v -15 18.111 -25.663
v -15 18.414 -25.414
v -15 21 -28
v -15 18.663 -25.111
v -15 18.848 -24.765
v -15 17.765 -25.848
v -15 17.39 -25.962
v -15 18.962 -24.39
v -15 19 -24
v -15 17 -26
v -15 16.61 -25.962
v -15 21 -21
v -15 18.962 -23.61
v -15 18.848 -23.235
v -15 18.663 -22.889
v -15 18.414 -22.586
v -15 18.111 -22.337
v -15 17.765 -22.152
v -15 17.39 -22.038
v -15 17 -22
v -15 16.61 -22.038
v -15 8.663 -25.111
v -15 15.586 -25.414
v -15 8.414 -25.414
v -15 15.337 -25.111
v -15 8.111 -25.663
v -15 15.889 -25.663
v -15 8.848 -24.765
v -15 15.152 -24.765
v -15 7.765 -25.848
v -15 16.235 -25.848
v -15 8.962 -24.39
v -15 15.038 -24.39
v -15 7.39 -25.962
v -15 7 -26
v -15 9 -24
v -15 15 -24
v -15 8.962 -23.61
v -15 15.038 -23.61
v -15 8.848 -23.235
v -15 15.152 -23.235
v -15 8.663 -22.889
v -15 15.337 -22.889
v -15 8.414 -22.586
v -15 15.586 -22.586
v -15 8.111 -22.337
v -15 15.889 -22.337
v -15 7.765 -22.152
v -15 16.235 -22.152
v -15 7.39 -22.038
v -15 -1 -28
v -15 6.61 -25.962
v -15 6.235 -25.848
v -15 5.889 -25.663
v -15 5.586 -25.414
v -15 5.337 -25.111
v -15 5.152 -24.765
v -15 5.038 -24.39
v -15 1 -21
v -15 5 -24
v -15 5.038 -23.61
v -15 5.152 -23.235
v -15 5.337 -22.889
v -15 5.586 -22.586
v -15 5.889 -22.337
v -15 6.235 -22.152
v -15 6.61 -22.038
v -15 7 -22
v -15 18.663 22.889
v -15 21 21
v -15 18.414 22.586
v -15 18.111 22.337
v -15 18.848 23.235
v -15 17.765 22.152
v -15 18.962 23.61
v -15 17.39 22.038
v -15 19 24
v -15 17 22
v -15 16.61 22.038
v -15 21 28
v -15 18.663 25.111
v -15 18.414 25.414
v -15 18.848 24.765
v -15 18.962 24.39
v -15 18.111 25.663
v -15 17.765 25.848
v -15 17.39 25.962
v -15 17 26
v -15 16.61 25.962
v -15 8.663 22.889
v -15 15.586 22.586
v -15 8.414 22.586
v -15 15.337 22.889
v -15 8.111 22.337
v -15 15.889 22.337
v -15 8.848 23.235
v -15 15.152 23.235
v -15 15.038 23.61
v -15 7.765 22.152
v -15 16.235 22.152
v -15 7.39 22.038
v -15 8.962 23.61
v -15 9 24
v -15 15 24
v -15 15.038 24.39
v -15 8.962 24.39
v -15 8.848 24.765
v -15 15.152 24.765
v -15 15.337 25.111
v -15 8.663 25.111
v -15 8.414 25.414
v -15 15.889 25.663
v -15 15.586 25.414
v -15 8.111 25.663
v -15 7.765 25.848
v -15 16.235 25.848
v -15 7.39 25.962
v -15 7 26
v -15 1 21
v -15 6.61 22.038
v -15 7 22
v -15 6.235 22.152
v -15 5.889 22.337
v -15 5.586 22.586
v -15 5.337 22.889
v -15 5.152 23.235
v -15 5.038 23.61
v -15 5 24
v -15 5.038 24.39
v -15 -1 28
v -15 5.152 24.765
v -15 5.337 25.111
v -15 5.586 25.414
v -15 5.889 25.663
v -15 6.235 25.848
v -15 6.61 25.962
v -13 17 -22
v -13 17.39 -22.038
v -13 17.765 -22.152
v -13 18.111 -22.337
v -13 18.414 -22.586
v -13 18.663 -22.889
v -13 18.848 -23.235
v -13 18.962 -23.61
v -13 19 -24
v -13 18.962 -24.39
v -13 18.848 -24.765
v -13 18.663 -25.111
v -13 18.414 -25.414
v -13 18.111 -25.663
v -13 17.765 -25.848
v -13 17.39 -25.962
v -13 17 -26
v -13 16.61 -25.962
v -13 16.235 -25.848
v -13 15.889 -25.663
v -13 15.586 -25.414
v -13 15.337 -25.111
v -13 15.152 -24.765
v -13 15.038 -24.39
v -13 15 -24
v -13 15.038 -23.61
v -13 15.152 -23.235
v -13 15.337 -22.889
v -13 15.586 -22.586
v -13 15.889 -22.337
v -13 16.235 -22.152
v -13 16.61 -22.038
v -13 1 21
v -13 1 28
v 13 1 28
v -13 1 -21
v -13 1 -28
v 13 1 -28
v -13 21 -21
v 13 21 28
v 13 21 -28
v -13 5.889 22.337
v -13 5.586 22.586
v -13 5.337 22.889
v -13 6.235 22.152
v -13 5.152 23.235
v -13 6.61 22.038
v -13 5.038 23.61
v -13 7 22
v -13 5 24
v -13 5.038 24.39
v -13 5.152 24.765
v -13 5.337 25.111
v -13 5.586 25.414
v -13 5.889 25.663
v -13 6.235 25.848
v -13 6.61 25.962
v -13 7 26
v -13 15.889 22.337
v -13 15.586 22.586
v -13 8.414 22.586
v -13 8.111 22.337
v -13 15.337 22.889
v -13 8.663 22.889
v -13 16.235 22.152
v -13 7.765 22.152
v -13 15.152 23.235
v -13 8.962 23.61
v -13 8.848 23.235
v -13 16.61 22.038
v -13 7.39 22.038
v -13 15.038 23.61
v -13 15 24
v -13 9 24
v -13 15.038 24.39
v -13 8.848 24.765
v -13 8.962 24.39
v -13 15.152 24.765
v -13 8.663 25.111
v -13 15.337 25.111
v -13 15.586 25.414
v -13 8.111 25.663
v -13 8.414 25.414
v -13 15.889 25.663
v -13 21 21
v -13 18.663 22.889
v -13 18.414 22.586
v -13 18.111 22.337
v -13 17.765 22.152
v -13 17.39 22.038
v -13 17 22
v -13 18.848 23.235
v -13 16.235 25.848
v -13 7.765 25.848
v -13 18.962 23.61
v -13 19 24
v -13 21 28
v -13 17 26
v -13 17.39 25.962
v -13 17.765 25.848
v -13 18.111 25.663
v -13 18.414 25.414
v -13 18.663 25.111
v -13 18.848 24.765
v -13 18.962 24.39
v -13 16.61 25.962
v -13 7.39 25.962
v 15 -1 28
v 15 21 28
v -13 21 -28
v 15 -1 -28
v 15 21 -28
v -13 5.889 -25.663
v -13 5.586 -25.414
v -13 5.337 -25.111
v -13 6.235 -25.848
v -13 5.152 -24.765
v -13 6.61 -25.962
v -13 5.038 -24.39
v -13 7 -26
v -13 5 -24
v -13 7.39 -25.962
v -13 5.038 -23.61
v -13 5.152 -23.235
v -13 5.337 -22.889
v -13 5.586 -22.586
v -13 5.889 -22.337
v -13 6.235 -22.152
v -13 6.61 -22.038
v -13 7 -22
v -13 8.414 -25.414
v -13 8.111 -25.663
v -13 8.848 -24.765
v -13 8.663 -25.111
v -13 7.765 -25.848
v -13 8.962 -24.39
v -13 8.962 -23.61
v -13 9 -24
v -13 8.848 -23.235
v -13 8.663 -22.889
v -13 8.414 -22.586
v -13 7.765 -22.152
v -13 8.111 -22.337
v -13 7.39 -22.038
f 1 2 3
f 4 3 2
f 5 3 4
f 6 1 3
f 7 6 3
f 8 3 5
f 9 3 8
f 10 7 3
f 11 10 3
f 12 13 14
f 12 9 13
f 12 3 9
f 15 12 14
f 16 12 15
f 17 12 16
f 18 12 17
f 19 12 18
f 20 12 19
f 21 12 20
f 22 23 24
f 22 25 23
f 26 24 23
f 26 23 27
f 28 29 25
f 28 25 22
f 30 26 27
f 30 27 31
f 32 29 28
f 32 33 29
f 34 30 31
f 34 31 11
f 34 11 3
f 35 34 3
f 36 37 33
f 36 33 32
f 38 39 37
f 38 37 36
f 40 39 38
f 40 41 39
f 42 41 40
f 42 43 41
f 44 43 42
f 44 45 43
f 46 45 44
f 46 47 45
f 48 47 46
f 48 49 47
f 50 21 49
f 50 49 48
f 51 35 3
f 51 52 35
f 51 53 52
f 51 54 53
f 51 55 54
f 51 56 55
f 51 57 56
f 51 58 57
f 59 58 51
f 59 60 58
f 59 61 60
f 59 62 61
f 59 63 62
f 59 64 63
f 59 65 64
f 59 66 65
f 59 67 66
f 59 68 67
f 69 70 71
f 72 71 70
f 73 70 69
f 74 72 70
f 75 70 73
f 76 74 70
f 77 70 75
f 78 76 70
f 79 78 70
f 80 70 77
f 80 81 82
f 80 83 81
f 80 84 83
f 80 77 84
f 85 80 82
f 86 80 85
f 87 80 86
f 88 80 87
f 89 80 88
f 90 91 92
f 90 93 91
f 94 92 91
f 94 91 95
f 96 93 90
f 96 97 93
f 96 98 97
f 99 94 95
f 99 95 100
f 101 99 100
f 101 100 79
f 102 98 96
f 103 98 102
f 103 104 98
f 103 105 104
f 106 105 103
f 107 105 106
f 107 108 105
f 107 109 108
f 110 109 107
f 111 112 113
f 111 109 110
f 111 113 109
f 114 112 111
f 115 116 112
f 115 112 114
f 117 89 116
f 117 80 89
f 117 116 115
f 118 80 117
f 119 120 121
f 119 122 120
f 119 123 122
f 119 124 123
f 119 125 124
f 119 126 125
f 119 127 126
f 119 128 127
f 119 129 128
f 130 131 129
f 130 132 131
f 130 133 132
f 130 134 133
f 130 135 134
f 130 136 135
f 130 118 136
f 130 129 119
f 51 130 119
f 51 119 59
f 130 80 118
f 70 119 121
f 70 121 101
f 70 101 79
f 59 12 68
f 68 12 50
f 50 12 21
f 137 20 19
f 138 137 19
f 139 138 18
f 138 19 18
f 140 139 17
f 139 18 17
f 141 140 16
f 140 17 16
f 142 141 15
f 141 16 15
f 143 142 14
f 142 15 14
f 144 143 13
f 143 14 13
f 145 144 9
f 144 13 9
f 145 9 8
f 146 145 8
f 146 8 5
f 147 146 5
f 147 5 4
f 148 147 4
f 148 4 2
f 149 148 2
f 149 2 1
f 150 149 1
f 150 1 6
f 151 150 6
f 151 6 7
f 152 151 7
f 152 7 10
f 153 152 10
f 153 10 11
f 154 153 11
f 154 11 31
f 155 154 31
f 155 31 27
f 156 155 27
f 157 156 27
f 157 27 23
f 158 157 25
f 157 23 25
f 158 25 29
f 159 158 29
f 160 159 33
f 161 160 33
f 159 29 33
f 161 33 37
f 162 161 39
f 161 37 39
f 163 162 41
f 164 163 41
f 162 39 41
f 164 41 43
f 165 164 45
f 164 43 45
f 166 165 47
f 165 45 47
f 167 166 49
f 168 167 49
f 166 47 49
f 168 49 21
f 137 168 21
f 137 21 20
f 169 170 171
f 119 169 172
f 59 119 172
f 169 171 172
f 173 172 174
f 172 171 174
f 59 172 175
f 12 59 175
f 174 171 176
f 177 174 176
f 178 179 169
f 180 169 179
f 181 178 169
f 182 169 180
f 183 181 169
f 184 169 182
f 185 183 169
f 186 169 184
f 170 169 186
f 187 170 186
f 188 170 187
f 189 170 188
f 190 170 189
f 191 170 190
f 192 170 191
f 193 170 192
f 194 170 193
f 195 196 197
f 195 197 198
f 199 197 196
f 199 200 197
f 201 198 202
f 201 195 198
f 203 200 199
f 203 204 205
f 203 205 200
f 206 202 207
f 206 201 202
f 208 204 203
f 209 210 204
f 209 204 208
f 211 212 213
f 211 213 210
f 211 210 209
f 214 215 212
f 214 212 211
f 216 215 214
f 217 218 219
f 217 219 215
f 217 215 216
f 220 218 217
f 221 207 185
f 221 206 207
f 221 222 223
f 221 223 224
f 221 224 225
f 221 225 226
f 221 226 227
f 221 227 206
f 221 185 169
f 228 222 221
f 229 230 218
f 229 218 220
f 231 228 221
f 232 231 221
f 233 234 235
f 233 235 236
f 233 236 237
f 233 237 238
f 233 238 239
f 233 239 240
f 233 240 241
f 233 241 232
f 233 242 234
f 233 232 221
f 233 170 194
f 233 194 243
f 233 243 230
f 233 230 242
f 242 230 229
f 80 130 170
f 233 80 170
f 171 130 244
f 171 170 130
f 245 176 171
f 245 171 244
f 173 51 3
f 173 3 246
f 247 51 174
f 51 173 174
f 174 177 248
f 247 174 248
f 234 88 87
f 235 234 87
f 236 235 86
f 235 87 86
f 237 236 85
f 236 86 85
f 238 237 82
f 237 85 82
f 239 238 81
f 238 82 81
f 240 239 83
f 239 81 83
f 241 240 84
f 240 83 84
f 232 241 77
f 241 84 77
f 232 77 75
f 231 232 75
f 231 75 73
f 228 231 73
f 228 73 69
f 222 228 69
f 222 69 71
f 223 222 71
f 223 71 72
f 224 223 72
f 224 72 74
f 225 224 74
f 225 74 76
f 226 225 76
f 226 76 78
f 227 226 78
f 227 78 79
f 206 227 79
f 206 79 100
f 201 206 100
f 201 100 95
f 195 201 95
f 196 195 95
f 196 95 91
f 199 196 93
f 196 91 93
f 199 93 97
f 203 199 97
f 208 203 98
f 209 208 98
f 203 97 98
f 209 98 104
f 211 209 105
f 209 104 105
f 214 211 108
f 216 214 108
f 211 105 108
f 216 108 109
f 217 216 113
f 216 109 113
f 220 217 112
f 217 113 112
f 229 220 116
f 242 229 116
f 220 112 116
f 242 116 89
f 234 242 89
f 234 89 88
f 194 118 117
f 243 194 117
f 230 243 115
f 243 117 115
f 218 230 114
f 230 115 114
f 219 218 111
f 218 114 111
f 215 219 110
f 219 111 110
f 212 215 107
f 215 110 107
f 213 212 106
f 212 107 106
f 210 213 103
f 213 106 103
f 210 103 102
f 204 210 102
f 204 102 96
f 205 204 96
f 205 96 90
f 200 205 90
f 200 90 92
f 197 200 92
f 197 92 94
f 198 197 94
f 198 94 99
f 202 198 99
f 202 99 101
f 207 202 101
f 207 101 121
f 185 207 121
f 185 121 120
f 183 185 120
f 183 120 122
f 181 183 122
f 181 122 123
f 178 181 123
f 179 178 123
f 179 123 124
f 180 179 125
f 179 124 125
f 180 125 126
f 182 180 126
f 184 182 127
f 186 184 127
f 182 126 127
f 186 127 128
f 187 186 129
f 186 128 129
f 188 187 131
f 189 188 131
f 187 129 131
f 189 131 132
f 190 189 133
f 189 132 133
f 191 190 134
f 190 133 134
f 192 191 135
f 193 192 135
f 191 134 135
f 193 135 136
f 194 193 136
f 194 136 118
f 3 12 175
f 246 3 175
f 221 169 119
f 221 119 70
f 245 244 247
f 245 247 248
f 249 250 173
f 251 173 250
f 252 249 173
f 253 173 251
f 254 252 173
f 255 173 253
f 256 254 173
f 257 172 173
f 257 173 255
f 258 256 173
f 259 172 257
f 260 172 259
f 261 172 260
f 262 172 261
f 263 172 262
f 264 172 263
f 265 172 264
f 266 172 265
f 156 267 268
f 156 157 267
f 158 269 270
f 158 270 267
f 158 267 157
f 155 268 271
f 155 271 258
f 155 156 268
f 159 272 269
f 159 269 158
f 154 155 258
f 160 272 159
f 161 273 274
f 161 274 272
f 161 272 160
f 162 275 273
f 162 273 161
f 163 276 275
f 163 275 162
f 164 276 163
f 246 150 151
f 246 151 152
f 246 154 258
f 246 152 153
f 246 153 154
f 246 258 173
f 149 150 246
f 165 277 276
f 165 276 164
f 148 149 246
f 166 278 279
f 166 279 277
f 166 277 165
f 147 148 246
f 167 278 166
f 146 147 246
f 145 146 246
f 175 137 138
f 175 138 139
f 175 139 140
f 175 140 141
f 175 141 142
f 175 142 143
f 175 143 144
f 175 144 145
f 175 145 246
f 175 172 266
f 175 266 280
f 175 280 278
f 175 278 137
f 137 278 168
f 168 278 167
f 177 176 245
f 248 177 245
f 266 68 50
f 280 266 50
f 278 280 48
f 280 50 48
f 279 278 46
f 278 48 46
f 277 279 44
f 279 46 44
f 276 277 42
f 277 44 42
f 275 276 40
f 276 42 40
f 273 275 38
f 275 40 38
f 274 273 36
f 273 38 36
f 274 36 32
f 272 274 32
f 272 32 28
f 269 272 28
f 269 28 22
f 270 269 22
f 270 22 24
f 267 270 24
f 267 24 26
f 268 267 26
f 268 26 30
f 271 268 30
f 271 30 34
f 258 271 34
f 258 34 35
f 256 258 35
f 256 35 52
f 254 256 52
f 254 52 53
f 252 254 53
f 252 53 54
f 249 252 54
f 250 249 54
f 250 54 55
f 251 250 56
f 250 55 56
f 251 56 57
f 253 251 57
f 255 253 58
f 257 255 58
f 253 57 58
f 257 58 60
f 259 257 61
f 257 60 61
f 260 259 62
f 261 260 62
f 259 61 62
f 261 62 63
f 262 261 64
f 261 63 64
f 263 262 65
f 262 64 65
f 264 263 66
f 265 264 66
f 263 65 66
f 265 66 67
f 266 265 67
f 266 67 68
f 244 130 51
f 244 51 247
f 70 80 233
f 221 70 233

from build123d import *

# Parameters (mm, degrees)
SKETCH_1_W          = 2
SKETCH_1_H          = 20
SKETCH_1_W_2        = 30
SKETCH_1_H_2        = 2
EXTRUDE_1_DEPTH     = 28
SKETCH_2_W          = 42
SKETCH_2_H          = 20
CUT_EXTRUDE_1_DEPTH = 39.078865529
CUT_EXTRUDE_3_REACH = 48.098
SKETCH_3_R          = 2


with BuildPart() as part:
    # 草图1 → 凸台-拉伸1 (new, symmetric)
    with BuildSketch(Plane.XY):
        with Locations((-14, 11)):
            Rectangle(SKETCH_1_W, SKETCH_1_H)
        Rectangle(SKETCH_1_W_2, SKETCH_1_H_2)
        with Locations((14, 11)):
            Rectangle(SKETCH_1_W, SKETCH_1_H)
    extrude(amount=EXTRUDE_1_DEPTH, both=True)

    # 草图2 → 切除-拉伸1 (cut, through all)
    with BuildSketch(Plane(origin=(0, 0, 0), x_dir=(0, 0, -1), z_dir=(1, 0, 0))):
        with Locations((0, 11)):
            Rectangle(SKETCH_2_W, SKETCH_2_H)
    extrude(amount=-CUT_EXTRUDE_1_DEPTH, mode=Mode.SUBTRACT)

    # 草图3 → 切除-拉伸3 (cut, up to next)
    with BuildSketch(Plane.ZY.offset(15), mode=Mode.PRIVATE) as cut_extrude_3_sk1:
        with Locations((-24, 17)):
            Circle(SKETCH_3_R)
    cut_extrude_3_tool1 = extrude(cut_extrude_3_sk1.sketch, amount=-CUT_EXTRUDE_3_REACH, mode=Mode.PRIVATE) & part.part
    # 草图3 → 切除-拉伸3 (cut, up to next)
    with BuildSketch(Plane.ZY.offset(15), mode=Mode.PRIVATE) as cut_extrude_3_sk2:
        with Locations((-24, 7)):
            Circle(SKETCH_3_R)
    cut_extrude_3_tool2 = extrude(cut_extrude_3_sk2.sketch, amount=-CUT_EXTRUDE_3_REACH, mode=Mode.PRIVATE) & part.part
    # 草图3 → 切除-拉伸3 (cut, up to next)
    with BuildSketch(Plane.ZY.offset(15), mode=Mode.PRIVATE) as cut_extrude_3_sk3:
        with Locations((24, 7)):
            Circle(SKETCH_3_R)
    cut_extrude_3_tool3 = extrude(cut_extrude_3_sk3.sketch, amount=-CUT_EXTRUDE_3_REACH, mode=Mode.PRIVATE) & part.part
    # 草图3 → 切除-拉伸3 (cut, up to next)
    with BuildSketch(Plane.ZY.offset(15), mode=Mode.PRIVATE) as cut_extrude_3_sk4:
        with Locations((24, 17)):
            Circle(SKETCH_3_R)
    cut_extrude_3_tool4 = extrude(cut_extrude_3_sk4.sketch, amount=-CUT_EXTRUDE_3_REACH, mode=Mode.PRIVATE) & part.part
    add(cut_extrude_3_tool1.solids().sort_by_distance((-15, 17, -24))[0], mode=Mode.SUBTRACT)
    add(cut_extrude_3_tool2.solids().sort_by_distance((-15, 7, -24))[0], mode=Mode.SUBTRACT)
    add(cut_extrude_3_tool3.solids().sort_by_distance((-15, 7, 24))[0], mode=Mode.SUBTRACT)
    add(cut_extrude_3_tool4.solids().sort_by_distance((-15, 17, 24))[0], mode=Mode.SUBTRACT)


solid = part.part
